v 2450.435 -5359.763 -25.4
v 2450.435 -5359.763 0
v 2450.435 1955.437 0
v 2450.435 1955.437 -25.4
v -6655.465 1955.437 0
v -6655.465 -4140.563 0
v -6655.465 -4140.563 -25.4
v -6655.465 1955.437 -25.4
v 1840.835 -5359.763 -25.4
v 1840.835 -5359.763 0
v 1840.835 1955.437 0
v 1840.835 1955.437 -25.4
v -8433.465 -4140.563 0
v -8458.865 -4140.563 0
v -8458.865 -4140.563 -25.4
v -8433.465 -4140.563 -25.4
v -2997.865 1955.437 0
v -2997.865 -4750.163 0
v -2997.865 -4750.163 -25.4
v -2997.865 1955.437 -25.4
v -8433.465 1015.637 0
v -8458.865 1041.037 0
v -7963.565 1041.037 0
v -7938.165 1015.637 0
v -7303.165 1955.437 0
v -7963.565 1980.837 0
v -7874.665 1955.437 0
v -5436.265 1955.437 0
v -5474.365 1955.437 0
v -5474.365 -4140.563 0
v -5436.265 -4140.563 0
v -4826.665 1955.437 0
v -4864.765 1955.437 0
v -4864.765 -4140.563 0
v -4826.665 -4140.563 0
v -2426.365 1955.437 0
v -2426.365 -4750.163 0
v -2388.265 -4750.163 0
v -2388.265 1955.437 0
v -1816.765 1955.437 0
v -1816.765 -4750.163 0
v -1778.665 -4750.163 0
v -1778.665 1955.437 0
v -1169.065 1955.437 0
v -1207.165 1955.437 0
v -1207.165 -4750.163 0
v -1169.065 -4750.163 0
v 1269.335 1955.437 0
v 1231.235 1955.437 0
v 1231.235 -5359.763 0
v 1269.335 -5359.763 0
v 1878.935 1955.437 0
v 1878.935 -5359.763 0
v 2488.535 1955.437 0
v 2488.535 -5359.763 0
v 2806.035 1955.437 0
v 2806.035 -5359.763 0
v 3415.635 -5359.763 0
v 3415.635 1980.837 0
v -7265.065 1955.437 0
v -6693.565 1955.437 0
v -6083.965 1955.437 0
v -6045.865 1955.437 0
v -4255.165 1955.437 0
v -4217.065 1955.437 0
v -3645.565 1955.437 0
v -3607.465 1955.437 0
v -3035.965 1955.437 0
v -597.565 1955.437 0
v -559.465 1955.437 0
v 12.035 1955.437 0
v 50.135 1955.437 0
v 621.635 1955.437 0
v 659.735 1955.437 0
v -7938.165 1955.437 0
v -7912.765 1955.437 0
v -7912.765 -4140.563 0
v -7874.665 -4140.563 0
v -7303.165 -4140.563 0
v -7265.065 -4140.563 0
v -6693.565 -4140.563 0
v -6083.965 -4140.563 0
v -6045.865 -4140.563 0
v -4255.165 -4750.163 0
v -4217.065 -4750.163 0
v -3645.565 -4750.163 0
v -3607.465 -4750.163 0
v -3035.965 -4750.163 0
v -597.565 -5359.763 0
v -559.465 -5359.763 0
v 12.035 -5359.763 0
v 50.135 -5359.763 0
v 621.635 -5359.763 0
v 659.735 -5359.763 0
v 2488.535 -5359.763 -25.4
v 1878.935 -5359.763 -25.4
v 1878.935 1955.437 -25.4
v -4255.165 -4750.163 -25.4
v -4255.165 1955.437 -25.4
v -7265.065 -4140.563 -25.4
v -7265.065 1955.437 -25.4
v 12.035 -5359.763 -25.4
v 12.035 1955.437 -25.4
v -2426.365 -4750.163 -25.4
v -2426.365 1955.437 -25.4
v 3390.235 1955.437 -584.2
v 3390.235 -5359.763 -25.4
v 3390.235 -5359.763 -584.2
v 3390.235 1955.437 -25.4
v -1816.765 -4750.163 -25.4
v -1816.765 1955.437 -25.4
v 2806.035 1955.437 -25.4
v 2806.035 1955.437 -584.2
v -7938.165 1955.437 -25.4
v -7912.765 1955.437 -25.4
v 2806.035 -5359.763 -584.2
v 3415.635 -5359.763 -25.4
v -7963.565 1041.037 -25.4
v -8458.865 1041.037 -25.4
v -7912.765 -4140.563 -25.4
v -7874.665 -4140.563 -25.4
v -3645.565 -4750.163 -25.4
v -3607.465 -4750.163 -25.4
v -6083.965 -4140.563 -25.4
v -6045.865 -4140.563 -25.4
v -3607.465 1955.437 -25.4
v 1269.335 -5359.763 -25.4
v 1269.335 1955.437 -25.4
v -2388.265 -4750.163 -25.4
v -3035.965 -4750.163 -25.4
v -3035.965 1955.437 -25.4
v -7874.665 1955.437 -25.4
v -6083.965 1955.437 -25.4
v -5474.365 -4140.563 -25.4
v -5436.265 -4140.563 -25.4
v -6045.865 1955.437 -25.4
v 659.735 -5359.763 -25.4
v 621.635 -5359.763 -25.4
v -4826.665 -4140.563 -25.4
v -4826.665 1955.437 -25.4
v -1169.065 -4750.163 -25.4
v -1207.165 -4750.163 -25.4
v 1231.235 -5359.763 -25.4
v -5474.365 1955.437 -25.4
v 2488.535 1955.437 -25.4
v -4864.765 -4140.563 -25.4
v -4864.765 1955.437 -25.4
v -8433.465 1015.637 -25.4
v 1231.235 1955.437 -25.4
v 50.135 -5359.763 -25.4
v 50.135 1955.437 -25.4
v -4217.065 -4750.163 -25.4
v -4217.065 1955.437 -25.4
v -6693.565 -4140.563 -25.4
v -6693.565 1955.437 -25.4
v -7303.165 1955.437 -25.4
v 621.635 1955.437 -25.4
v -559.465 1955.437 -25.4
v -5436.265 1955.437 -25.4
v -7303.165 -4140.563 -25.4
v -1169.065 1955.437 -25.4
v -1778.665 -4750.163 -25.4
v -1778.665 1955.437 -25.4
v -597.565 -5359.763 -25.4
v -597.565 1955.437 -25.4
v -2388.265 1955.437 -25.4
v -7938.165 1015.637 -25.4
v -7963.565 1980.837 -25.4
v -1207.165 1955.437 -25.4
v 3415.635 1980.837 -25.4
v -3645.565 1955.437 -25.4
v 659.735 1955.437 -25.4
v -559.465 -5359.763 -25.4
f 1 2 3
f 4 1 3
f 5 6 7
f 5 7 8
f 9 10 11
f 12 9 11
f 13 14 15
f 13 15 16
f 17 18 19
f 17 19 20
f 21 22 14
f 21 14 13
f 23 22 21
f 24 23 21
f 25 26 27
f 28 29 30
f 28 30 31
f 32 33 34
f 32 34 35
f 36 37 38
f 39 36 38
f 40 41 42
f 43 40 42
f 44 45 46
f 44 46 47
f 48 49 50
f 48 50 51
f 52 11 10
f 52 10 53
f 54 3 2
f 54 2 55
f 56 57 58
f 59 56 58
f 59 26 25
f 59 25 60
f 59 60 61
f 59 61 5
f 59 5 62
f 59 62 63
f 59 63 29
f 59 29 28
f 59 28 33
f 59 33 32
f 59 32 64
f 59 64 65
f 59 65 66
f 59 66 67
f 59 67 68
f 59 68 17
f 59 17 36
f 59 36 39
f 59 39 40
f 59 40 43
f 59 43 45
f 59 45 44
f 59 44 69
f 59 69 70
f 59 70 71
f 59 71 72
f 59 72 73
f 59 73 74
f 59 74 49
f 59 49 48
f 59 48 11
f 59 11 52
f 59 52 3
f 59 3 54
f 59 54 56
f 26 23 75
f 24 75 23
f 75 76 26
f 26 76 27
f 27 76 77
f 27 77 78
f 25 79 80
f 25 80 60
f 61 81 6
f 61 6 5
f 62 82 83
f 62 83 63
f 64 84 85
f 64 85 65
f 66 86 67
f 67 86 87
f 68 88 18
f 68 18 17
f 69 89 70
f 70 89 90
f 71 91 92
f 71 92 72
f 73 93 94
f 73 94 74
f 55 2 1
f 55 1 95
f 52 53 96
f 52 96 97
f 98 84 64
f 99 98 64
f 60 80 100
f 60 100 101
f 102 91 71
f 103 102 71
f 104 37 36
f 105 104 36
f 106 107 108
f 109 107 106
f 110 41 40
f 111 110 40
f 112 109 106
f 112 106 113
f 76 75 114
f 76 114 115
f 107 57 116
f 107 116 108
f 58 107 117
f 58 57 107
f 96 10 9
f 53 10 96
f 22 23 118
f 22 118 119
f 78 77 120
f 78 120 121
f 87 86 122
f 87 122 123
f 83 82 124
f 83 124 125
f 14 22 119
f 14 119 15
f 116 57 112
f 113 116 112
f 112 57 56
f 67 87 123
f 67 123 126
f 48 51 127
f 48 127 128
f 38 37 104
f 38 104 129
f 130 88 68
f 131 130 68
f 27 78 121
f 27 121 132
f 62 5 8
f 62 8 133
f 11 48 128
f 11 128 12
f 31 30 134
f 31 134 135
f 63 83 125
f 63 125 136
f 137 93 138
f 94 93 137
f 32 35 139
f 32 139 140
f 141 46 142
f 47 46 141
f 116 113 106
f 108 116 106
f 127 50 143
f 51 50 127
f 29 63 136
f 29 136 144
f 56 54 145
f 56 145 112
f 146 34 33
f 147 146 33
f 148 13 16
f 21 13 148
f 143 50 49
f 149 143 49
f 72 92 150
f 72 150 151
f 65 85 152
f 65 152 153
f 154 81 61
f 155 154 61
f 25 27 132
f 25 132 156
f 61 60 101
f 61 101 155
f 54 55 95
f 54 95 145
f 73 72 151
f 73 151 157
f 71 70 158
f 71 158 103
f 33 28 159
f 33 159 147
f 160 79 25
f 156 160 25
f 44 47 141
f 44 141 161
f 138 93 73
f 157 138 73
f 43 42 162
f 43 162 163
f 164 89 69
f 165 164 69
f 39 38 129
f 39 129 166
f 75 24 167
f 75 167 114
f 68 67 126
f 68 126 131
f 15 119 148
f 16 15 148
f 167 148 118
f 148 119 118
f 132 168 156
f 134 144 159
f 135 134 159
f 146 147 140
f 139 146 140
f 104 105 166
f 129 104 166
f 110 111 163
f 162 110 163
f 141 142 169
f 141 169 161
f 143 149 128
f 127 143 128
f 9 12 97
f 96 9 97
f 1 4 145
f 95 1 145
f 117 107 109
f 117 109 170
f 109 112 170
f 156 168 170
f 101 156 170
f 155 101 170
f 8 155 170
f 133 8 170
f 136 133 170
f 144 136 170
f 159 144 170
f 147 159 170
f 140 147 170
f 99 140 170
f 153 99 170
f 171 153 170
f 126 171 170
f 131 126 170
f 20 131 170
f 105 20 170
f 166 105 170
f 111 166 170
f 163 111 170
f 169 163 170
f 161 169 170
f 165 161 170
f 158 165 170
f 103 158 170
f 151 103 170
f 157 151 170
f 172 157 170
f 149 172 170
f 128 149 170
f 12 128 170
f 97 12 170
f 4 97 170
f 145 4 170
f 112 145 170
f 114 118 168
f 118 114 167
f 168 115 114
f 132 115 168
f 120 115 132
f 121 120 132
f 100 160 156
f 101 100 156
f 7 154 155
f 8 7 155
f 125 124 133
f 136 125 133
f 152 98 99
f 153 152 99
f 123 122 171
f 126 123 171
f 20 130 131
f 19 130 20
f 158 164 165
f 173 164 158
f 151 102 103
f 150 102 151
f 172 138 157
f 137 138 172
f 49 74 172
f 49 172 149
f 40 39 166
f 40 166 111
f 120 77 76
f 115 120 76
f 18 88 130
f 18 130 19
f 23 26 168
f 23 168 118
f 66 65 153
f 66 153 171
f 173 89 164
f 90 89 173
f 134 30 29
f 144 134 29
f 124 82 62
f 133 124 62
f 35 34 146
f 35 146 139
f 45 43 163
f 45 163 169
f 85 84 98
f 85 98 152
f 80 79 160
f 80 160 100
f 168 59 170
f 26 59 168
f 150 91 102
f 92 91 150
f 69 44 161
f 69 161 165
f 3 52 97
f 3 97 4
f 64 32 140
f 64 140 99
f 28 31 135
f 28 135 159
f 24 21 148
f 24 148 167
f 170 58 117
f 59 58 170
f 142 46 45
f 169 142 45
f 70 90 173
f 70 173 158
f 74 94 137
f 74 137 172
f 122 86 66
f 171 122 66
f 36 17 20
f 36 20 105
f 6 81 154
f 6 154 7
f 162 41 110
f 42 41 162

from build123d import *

# Parameters (mm, degrees)
F0_W     = 25.4
F0_H     = 914.4
F0_H_2   = 5156.2
F1_DEPTH = 25.4
F0_W_2   = 38.1
F0_H_3   = 6096
F0_H_4   = 6705.6
F0_H_5   = 7315.2
F2_DEPTH = 25.4
F0_W_3   = 292.1
F0_W_4   = 254
F3_DEPTH = 584.2


with BuildPart() as f1:
    # F0 (on Top) → F1 (new body)
    with BuildSketch(Plane.XY):
        Polygon((3415.6346725464, 1980.8369888306), (3390.2346725464, 1980.8369888306), (3390.2346725464, 1955.4369888306), (3390.2346725464, -5359.7630111694), (3415.6346725464, -5359.7630111694), align=None)
        Polygon((-7963.5653274536, 1955.4369888306), (-7938.1653274536, 1955.4369888306), (-7912.7653274536, 1955.4369888306), (-7874.6653274536, 1955.4369888306), (-7303.1653274536, 1955.4369888306), (-7265.0653274536, 1955.4369888306), (-6693.5653274536, 1955.4369888306), (-6655.4653274536, 1955.4369888306), (-6083.9653274536, 1955.4369888306), (-6045.8653274536, 1955.4369888306), (-5474.3653274536, 1955.4369888306), (-5436.2653274536, 1955.4369888306), (-4864.7653274536, 1955.4369888306), (-4826.6653274536, 1955.4369888306), (-4255.1653274536, 1955.4369888306), (-4217.0653274536, 1955.4369888306), (-3645.5653274536, 1955.4369888306), (-3607.4653274536, 1955.4369888306), (-3035.9653274536, 1955.4369888306), (-2997.8653274536, 1955.4369888306), (-2426.3653274536, 1955.4369888306), (-2388.2653274536, 1955.4369888306), (-1816.7653274536, 1955.4369888306), (-1778.6653274536, 1955.4369888306), (-1207.1653274536, 1955.4369888306), (-1169.0653274536, 1955.4369888306), (-597.5653274536, 1955.4369888306), (-559.4653274536, 1955.4369888306), (12.0346725464, 1955.4369888306), (50.1346725464, 1955.4369888306), (621.6346725464, 1955.4369888306), (659.7346725464, 1955.4369888306), (1231.2346725464, 1955.4369888306), (1269.3346725464, 1955.4369888306), (1840.8346725464, 1955.4369888306), (1878.9346725464, 1955.4369888306), (2450.4346725464, 1955.4369888306), (2488.5346725464, 1955.4369888306), (2806.0346725464, 1955.4369888306), (3060.0346725464, 1955.4369888306), (3098.1346725464, 1955.4369888306), (3390.2346725464, 1955.4369888306), (3390.2346725464, 1980.8369888306), (-7963.5653274536, 1980.8369888306), align=None)
        with Locations((-7950.8653274536, 1498.2369888306)):
            Rectangle(F0_W, F0_H)
        Polygon((-7938.1653274536, 1015.6369888306), (-7938.1653274536, 1041.0369888306), (-7963.5653274536, 1041.0369888306), (-8458.8653274536, 1041.0369888306), (-8458.8653274536, 1015.6369888306), (-8433.4653274536, 1015.6369888306), align=None)
        with Locations((-8446.1653274536, -1562.4630111694)):
            Rectangle(F0_W, F0_H_2)
    extrude(amount=-F1_DEPTH)

    # F0 (on Top) → F2 (join)
    with BuildSketch(Plane.XY):
        with Locations((-7284.1153274536, -1092.5630111694)):
            Rectangle(F0_W_2, F0_H_3)
        with Locations((-6674.5153274536, -1092.5630111694)):
            Rectangle(F0_W_2, F0_H_3)
        with Locations((-6064.9153274536, -1092.5630111694)):
            Rectangle(F0_W_2, F0_H_3)
        with Locations((-5455.3153274536, -1092.5630111694)):
            Rectangle(F0_W_2, F0_H_3)
        with Locations((-4845.7153274536, -1092.5630111694)):
            Rectangle(F0_W_2, F0_H_3)
        with Locations((-4236.1153274536, -1397.3630111694)):
            Rectangle(F0_W_2, F0_H_4)
        with Locations((-3626.5153274536, -1397.3630111694)):
            Rectangle(F0_W_2, F0_H_4)
        with Locations((-3016.9153274536, -1397.3630111694)):
            Rectangle(F0_W_2, F0_H_4)
        with Locations((-2407.3153274536, -1397.3630111694)):
            Rectangle(F0_W_2, F0_H_4)
        with Locations((-7893.7153274536, -1092.5630111694)):
            Rectangle(F0_W_2, F0_H_3)
        with Locations((-1797.7153274536, -1397.3630111694)):
            Rectangle(F0_W_2, F0_H_4)
        with Locations((-1188.1153274536, -1397.3630111694)):
            Rectangle(F0_W_2, F0_H_4)
        with Locations((-578.5153274536, -1702.1630111694)):
            Rectangle(F0_W_2, F0_H_5)
        with Locations((31.0846725464, -1702.1630111694)):
            Rectangle(F0_W_2, F0_H_5)
        with Locations((640.6846725464, -1702.1630111694)):
            Rectangle(F0_W_2, F0_H_5)
        with Locations((1250.2846725464, -1702.1630111694)):
            Rectangle(F0_W_2, F0_H_5)
        with Locations((1859.8846725464, -1702.1630111694)):
            Rectangle(F0_W_2, F0_H_5)
        with Locations((2469.4846725464, -1702.1630111694)):
            Rectangle(F0_W_2, F0_H_5)
        with Locations((3079.0846725464, -1702.1630111694)):
            Rectangle(F0_W_2, F0_H_5)
    extrude(amount=-F2_DEPTH)

    # F0 (on Top) → F3 (join)
    with BuildSketch(Plane.XY):
        with Locations((3244.1846725464, -1702.1630111694)):
            Rectangle(F0_W_3, F0_H_5)
        with Locations((2933.0346725464, -1702.1630111694)):
            Rectangle(F0_W_4, F0_H_5)
        with Locations((3079.0846725464, -1702.1630111694)):
            Rectangle(F0_W_2, F0_H_5)
    extrude(amount=-F3_DEPTH)


solid = f1.part
